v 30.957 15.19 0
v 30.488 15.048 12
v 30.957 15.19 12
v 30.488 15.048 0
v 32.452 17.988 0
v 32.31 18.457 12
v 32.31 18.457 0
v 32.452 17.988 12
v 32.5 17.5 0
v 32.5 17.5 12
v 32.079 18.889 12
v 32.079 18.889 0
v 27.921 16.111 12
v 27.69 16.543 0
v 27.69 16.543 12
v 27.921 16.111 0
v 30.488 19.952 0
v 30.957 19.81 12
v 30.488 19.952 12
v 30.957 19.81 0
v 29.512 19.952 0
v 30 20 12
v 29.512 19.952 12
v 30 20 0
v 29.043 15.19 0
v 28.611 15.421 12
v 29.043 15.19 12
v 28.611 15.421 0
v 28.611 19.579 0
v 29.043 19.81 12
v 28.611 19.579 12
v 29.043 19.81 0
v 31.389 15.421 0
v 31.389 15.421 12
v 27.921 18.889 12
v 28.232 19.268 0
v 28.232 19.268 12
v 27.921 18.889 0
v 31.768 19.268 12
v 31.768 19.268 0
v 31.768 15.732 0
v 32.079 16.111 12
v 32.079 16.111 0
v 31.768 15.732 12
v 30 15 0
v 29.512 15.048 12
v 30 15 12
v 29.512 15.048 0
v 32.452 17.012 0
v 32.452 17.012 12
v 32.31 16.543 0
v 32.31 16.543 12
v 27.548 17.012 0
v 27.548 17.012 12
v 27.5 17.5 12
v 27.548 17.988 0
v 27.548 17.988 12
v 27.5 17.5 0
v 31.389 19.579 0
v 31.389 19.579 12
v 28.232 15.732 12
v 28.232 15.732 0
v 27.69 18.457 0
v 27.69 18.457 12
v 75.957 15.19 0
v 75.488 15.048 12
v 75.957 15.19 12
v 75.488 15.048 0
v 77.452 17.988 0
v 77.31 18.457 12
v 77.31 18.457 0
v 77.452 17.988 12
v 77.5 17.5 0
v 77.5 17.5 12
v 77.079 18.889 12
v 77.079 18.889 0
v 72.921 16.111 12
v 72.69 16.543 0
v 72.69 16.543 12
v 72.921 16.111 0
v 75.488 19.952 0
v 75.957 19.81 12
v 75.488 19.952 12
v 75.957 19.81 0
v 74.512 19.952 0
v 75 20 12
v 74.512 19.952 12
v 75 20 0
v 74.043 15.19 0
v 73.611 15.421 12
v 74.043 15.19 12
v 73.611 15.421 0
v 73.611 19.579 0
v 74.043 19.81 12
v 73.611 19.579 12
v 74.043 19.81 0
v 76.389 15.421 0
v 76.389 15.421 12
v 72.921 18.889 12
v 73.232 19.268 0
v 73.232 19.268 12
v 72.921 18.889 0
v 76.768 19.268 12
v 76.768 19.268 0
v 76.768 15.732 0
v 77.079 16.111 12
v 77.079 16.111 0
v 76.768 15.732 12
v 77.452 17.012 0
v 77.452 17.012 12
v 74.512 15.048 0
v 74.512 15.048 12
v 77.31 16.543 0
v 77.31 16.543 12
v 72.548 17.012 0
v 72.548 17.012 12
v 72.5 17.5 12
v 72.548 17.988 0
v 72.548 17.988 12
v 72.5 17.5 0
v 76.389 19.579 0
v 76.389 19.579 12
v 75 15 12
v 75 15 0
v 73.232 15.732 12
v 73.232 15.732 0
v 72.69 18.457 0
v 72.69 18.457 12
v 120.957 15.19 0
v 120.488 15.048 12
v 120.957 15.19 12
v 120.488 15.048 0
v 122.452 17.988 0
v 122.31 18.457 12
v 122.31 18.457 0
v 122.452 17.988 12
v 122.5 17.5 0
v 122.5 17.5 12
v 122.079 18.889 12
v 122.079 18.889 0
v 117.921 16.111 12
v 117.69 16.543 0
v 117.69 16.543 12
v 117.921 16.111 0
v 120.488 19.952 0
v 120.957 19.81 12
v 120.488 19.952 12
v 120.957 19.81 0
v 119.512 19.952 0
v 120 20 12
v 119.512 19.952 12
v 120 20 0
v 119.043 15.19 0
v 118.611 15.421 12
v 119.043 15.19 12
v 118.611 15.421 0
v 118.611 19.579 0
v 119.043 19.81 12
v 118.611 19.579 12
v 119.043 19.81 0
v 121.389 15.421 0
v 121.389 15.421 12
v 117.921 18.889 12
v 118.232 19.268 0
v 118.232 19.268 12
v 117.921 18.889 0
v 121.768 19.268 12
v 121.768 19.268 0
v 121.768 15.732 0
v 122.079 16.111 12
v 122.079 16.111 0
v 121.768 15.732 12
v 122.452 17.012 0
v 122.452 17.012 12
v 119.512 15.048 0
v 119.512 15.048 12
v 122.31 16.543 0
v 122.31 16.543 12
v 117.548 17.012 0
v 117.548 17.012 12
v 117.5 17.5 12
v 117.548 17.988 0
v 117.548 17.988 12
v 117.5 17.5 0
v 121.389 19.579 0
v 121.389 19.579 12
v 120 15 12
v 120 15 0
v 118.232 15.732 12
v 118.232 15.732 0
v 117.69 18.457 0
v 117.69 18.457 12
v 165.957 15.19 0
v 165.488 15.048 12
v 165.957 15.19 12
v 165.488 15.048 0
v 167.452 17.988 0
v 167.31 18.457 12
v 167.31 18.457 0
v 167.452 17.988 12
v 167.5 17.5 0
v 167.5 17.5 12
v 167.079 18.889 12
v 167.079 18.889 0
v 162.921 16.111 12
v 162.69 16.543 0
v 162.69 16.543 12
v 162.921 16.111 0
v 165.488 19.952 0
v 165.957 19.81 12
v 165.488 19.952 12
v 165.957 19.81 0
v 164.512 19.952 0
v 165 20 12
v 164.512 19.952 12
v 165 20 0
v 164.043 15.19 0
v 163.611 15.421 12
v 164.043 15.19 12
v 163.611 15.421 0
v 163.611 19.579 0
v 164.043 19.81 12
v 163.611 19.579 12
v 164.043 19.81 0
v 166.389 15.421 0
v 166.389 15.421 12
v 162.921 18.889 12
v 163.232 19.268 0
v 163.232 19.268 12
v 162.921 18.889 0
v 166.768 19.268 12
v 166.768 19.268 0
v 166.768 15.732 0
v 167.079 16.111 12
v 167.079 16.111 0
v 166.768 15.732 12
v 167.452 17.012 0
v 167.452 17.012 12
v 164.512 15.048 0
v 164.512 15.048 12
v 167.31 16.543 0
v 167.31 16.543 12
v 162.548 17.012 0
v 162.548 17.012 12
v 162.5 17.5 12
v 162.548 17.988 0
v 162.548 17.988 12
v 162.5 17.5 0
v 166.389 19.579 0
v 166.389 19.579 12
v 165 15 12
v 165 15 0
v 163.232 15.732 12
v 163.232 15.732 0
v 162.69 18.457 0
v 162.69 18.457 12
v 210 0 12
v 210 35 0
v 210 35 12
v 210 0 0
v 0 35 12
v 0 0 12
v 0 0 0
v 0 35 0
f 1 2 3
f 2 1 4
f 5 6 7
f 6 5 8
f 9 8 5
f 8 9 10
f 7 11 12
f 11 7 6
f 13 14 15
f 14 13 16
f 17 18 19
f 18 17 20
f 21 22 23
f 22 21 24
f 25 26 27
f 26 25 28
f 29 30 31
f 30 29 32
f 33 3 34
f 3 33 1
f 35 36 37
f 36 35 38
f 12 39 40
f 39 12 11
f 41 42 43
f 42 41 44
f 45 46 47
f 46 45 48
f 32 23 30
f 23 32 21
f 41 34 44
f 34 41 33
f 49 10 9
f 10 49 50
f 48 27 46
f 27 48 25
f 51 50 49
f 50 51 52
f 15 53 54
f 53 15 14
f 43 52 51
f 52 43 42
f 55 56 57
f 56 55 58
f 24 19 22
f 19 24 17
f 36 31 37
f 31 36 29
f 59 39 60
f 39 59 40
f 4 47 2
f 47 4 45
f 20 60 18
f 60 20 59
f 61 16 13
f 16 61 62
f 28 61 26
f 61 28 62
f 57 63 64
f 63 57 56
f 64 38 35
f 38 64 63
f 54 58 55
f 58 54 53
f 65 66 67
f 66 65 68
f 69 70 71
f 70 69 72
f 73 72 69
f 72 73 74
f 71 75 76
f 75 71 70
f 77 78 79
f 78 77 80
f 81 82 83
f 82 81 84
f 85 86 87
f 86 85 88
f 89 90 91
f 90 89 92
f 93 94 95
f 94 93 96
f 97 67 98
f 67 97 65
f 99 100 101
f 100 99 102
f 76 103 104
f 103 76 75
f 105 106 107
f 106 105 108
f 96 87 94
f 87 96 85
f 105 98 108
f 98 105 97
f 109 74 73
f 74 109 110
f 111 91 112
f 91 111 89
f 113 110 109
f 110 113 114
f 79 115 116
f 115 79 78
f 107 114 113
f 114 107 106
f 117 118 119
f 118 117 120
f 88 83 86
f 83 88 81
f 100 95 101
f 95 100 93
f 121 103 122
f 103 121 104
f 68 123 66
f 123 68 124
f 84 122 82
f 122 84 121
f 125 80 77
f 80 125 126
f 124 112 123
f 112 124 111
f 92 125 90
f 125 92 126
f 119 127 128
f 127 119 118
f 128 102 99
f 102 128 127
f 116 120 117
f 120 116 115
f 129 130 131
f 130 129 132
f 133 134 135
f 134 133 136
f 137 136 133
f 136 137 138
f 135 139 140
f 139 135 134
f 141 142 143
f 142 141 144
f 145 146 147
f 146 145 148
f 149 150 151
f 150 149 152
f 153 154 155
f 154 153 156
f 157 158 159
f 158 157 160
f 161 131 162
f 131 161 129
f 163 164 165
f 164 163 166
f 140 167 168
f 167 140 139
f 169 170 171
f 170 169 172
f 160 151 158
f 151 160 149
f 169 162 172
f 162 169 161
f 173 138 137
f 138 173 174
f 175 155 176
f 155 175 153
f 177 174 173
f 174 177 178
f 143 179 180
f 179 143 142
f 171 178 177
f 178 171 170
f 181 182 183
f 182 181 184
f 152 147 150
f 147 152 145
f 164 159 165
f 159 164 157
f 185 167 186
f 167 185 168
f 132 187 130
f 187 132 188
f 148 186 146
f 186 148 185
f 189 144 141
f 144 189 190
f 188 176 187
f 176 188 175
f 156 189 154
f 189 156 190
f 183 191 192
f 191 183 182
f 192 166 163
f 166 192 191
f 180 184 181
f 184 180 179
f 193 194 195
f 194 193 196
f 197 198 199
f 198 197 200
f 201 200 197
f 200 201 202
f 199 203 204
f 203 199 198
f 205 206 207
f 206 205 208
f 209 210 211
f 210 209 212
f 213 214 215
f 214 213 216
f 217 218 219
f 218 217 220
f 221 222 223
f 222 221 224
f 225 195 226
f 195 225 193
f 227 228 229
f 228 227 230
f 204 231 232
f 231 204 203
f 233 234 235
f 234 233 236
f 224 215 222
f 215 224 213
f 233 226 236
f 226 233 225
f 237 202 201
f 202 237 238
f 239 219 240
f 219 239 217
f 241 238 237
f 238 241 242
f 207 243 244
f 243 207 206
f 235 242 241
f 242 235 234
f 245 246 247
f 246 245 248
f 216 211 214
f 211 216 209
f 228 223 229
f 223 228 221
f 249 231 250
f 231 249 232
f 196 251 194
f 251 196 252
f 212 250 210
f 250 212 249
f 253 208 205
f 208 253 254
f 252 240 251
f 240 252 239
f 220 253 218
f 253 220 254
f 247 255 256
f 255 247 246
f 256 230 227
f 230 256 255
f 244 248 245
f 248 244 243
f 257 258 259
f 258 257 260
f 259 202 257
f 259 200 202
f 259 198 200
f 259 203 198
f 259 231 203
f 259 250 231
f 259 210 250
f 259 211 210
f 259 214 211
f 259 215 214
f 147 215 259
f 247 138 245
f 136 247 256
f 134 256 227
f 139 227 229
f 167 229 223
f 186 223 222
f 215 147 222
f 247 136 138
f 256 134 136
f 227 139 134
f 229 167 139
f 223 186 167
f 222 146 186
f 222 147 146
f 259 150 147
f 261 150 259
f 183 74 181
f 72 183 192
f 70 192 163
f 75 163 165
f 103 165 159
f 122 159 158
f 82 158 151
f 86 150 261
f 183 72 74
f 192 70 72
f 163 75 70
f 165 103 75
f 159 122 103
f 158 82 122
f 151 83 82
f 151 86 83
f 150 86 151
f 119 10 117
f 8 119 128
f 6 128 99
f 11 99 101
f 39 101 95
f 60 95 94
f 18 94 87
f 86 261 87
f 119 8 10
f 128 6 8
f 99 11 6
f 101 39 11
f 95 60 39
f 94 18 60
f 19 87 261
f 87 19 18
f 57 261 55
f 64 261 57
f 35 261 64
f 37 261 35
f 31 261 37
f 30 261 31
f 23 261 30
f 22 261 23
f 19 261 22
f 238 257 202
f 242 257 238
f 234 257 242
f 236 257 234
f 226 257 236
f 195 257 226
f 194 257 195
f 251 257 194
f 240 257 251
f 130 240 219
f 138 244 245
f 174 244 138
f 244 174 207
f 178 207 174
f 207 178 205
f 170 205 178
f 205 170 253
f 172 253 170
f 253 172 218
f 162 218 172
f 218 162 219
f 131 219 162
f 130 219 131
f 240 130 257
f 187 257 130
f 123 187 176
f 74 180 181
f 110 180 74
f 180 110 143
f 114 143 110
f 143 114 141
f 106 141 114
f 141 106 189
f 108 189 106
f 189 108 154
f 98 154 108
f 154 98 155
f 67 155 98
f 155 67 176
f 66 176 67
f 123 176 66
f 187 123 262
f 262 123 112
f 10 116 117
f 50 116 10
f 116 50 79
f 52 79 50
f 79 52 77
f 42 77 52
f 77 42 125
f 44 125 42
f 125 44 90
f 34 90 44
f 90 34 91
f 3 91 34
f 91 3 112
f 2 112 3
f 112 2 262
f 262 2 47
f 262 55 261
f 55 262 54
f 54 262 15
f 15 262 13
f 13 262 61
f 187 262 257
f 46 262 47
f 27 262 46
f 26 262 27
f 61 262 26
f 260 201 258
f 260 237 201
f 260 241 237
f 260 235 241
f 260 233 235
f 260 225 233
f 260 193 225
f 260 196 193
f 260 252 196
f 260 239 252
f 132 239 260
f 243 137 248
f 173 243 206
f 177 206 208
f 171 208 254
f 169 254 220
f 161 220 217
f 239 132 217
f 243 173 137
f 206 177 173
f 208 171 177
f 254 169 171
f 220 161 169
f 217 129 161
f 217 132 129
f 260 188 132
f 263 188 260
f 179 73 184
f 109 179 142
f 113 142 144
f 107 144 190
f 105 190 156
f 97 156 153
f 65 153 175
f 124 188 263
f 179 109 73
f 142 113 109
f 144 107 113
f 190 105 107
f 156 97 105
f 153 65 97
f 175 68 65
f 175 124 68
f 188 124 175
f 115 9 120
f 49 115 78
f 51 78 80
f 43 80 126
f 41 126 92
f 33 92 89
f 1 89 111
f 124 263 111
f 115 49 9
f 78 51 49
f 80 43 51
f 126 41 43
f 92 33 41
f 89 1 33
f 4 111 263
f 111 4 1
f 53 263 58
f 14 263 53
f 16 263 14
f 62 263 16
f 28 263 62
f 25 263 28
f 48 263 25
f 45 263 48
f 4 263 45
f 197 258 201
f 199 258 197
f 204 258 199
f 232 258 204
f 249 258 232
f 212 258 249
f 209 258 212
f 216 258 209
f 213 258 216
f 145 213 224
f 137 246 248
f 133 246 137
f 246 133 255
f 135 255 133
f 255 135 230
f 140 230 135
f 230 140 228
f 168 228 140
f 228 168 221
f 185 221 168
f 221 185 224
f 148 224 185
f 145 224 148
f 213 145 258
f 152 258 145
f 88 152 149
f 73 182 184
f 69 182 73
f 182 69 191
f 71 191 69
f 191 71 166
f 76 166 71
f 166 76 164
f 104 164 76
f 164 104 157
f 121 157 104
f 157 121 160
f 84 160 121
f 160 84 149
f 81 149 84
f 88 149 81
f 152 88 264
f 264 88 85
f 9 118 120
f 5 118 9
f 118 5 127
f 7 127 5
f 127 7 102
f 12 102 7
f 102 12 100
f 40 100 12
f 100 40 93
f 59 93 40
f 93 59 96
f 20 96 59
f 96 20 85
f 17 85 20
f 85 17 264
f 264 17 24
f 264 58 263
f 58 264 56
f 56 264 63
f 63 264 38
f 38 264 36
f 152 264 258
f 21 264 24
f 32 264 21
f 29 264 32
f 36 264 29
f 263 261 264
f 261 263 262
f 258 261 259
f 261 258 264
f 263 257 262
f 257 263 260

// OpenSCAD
$fn = 32;

// ----------------------------------------------------------------------
// Long rail: 200-250 mm mounting rail
// ----------------------------------------------------------------------

// --- parameters (mm) ---
rail_l = 210;             // rail length, X
rail_w = 35;              // rail width, Y
rail_t = 12;              // rail thickness, Z
hole_d = 5;               // mounting hole diameter
hole_start = 30;          // first hole offset from the end
hole_pitch = 45;          // hole pitch
holes = 4;                // number of holes

difference() {
  cube([rail_l, rail_w, rail_t]);
  for (i = [0 : holes - 1])
    translate([hole_start + i * hole_pitch, rail_w / 2, -1])
      cylinder(h = rail_t + 2, d = hole_d);
}
